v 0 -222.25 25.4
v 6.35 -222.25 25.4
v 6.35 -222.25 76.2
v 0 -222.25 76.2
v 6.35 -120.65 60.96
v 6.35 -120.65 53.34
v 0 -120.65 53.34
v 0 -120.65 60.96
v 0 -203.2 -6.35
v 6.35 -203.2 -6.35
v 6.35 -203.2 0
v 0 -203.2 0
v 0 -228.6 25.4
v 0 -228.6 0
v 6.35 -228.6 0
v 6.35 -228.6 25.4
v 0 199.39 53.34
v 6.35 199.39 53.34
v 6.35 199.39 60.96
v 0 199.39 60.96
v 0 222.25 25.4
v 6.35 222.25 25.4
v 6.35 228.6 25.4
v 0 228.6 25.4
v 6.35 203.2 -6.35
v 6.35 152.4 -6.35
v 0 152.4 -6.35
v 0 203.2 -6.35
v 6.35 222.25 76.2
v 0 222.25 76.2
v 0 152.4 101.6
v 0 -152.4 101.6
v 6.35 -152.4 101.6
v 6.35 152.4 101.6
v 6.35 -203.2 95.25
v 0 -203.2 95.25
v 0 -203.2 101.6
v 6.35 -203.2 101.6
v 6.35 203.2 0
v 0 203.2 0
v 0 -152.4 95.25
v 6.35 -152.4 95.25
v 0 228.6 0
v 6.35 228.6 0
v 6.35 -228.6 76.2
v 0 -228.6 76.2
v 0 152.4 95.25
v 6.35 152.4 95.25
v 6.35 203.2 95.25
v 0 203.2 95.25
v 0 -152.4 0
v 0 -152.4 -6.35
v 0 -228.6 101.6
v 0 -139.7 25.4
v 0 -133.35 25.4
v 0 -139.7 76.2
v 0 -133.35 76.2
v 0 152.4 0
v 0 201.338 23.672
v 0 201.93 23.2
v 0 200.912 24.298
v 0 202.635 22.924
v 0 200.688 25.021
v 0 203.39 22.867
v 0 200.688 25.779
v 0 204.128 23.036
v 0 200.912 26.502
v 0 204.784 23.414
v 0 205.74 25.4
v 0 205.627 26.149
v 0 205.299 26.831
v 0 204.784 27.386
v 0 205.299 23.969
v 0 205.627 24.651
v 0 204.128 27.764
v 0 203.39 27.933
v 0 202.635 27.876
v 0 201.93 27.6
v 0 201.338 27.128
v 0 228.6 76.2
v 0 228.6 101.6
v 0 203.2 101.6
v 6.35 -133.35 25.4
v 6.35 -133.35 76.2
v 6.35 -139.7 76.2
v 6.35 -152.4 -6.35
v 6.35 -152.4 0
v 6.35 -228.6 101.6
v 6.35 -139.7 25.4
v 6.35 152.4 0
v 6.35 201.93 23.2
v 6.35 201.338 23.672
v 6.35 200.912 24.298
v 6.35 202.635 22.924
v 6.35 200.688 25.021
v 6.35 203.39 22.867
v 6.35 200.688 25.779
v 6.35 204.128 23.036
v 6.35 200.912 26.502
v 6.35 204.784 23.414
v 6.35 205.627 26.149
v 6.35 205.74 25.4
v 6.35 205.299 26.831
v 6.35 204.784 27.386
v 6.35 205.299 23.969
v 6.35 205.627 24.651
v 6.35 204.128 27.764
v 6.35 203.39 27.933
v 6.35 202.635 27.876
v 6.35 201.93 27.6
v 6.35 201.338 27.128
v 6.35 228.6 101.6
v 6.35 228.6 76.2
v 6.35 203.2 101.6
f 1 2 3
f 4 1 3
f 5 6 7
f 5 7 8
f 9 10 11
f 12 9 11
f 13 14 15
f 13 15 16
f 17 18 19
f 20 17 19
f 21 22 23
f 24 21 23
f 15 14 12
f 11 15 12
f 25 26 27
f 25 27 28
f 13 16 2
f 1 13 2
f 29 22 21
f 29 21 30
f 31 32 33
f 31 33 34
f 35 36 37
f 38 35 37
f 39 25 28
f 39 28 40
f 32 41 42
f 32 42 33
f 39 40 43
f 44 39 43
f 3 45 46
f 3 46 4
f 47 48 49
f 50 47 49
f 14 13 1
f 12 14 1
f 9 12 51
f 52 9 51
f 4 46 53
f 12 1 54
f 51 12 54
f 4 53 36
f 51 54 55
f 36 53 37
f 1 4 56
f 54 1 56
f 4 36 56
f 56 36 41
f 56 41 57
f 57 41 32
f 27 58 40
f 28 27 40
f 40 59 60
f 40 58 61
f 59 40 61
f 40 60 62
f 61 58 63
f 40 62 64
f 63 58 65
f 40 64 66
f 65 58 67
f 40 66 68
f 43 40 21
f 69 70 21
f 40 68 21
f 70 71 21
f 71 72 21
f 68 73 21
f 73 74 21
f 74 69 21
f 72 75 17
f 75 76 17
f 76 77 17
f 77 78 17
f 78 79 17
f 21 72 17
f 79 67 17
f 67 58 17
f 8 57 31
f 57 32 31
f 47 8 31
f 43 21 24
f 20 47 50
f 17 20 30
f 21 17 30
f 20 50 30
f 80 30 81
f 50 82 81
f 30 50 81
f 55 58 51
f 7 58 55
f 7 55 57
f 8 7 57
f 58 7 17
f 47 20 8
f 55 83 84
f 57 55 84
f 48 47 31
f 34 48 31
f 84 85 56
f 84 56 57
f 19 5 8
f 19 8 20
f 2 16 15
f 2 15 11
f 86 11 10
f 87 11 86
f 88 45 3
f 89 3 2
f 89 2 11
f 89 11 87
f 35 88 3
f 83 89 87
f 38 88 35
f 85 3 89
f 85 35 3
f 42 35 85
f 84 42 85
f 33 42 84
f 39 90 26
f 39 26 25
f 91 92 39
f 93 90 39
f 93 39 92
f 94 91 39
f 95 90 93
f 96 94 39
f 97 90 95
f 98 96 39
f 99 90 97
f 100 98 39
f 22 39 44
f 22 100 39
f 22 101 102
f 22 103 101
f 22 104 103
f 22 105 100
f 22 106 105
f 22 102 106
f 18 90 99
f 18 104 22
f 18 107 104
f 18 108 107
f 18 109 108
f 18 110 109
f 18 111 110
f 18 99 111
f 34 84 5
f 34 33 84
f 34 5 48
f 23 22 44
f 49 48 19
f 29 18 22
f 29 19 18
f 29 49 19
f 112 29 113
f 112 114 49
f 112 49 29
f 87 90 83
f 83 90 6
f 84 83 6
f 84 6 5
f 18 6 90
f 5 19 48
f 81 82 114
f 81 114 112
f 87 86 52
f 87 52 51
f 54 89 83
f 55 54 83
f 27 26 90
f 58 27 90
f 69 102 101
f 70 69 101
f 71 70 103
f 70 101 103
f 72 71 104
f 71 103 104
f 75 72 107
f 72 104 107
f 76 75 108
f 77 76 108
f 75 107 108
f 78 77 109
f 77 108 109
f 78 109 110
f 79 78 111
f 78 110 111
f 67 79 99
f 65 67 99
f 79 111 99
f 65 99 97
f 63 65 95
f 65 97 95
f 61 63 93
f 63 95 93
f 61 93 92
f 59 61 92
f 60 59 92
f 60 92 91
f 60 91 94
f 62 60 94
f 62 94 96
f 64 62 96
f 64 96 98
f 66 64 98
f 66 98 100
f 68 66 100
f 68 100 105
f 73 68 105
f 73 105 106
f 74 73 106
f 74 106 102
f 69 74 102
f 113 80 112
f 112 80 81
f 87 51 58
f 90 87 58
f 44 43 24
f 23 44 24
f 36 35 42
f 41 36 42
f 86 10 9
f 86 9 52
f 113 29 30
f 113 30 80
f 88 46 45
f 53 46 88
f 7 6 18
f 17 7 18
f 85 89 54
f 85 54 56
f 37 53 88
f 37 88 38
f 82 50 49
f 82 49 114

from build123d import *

# Parameters (mm, degrees)
F0_W      = 457.2
F0_H      = 101.6
F1_DEPTH  = 6.35
F2_W      = 50.8
F2_H      = 6.35
F3_DEPTH  = 6.35
F4_R      = 2.54
F5_DEPTH  = 6.351
F6_W      = 6.35
F6_H      = 50.8
F7_DEPTH  = 25.4
F9_W      = 6.35
F9_H      = 50.8
F10_DEPTH = 25.4
F11_W     = 50.8
F11_H     = 6.35
F12_DEPTH = 25.4
F13_W     = 320.04
F13_H     = 7.62
F14_DEPTH = 25.4


with BuildPart() as f1:
    # F0 (on Right) → F1 (new body)
    with BuildSketch(Plane.YZ):
        with Locations((0, 50.8)):
            Rectangle(F0_W, F0_H)
    extrude(amount=F1_DEPTH)

    # F4 (on face) → F5 (cut, through all)
    with BuildSketch(Plane.YZ.offset(6.35)):
        with Locations((203.2, 25.4)):
            Circle(F4_R)
    extrude(amount=-F5_DEPTH, mode=Mode.SUBTRACT)

    # F6 (on face) → F7 (cut)
    with BuildSketch(Plane.YZ.offset(6.35)):
        with Locations((225.425, 50.8)):
            Rectangle(F6_W, F6_H)
        with Locations((-225.425, 50.8)):
            Rectangle(F6_W, F6_H)
    extrude(amount=-F7_DEPTH, mode=Mode.SUBTRACT)


with BuildPart() as f3:
    # F2 (on face) → F3 (new body)
    with BuildSketch(Plane.YZ.offset(6.35)):
        with Locations((177.8, -3.175)):
            Rectangle(F2_W, F2_H)
        with Locations((-177.8, -3.175)):
            Rectangle(F2_W, F2_H)
    extrude(amount=-F3_DEPTH)

    # F8: union F1
    add(f1.part)

    # F9 (on face) → F10 (cut)
    with BuildSketch(Plane.YZ.offset(6.35)):
        with Locations((-136.525, 50.8)):
            Rectangle(F9_W, F9_H)
    extrude(amount=-F10_DEPTH, mode=Mode.SUBTRACT)

    # F11 (on face) → F12 (cut)
    with BuildSketch(Plane.YZ.offset(6.35)):
        with Locations((-177.8, 98.425)):
            Rectangle(F11_W, F11_H)
        with Locations((177.8, 98.425)):
            Rectangle(F11_W, F11_H)
    extrude(amount=-F12_DEPTH, mode=Mode.SUBTRACT)

    # F13 (on face) → F14 (cut)
    with BuildSketch(Plane.YZ.offset(6.35)):
        with Locations((39.37, 57.15)):
            Rectangle(F13_W, F13_H)
    extrude(amount=-F14_DEPTH, mode=Mode.SUBTRACT)


solid = f3.part
